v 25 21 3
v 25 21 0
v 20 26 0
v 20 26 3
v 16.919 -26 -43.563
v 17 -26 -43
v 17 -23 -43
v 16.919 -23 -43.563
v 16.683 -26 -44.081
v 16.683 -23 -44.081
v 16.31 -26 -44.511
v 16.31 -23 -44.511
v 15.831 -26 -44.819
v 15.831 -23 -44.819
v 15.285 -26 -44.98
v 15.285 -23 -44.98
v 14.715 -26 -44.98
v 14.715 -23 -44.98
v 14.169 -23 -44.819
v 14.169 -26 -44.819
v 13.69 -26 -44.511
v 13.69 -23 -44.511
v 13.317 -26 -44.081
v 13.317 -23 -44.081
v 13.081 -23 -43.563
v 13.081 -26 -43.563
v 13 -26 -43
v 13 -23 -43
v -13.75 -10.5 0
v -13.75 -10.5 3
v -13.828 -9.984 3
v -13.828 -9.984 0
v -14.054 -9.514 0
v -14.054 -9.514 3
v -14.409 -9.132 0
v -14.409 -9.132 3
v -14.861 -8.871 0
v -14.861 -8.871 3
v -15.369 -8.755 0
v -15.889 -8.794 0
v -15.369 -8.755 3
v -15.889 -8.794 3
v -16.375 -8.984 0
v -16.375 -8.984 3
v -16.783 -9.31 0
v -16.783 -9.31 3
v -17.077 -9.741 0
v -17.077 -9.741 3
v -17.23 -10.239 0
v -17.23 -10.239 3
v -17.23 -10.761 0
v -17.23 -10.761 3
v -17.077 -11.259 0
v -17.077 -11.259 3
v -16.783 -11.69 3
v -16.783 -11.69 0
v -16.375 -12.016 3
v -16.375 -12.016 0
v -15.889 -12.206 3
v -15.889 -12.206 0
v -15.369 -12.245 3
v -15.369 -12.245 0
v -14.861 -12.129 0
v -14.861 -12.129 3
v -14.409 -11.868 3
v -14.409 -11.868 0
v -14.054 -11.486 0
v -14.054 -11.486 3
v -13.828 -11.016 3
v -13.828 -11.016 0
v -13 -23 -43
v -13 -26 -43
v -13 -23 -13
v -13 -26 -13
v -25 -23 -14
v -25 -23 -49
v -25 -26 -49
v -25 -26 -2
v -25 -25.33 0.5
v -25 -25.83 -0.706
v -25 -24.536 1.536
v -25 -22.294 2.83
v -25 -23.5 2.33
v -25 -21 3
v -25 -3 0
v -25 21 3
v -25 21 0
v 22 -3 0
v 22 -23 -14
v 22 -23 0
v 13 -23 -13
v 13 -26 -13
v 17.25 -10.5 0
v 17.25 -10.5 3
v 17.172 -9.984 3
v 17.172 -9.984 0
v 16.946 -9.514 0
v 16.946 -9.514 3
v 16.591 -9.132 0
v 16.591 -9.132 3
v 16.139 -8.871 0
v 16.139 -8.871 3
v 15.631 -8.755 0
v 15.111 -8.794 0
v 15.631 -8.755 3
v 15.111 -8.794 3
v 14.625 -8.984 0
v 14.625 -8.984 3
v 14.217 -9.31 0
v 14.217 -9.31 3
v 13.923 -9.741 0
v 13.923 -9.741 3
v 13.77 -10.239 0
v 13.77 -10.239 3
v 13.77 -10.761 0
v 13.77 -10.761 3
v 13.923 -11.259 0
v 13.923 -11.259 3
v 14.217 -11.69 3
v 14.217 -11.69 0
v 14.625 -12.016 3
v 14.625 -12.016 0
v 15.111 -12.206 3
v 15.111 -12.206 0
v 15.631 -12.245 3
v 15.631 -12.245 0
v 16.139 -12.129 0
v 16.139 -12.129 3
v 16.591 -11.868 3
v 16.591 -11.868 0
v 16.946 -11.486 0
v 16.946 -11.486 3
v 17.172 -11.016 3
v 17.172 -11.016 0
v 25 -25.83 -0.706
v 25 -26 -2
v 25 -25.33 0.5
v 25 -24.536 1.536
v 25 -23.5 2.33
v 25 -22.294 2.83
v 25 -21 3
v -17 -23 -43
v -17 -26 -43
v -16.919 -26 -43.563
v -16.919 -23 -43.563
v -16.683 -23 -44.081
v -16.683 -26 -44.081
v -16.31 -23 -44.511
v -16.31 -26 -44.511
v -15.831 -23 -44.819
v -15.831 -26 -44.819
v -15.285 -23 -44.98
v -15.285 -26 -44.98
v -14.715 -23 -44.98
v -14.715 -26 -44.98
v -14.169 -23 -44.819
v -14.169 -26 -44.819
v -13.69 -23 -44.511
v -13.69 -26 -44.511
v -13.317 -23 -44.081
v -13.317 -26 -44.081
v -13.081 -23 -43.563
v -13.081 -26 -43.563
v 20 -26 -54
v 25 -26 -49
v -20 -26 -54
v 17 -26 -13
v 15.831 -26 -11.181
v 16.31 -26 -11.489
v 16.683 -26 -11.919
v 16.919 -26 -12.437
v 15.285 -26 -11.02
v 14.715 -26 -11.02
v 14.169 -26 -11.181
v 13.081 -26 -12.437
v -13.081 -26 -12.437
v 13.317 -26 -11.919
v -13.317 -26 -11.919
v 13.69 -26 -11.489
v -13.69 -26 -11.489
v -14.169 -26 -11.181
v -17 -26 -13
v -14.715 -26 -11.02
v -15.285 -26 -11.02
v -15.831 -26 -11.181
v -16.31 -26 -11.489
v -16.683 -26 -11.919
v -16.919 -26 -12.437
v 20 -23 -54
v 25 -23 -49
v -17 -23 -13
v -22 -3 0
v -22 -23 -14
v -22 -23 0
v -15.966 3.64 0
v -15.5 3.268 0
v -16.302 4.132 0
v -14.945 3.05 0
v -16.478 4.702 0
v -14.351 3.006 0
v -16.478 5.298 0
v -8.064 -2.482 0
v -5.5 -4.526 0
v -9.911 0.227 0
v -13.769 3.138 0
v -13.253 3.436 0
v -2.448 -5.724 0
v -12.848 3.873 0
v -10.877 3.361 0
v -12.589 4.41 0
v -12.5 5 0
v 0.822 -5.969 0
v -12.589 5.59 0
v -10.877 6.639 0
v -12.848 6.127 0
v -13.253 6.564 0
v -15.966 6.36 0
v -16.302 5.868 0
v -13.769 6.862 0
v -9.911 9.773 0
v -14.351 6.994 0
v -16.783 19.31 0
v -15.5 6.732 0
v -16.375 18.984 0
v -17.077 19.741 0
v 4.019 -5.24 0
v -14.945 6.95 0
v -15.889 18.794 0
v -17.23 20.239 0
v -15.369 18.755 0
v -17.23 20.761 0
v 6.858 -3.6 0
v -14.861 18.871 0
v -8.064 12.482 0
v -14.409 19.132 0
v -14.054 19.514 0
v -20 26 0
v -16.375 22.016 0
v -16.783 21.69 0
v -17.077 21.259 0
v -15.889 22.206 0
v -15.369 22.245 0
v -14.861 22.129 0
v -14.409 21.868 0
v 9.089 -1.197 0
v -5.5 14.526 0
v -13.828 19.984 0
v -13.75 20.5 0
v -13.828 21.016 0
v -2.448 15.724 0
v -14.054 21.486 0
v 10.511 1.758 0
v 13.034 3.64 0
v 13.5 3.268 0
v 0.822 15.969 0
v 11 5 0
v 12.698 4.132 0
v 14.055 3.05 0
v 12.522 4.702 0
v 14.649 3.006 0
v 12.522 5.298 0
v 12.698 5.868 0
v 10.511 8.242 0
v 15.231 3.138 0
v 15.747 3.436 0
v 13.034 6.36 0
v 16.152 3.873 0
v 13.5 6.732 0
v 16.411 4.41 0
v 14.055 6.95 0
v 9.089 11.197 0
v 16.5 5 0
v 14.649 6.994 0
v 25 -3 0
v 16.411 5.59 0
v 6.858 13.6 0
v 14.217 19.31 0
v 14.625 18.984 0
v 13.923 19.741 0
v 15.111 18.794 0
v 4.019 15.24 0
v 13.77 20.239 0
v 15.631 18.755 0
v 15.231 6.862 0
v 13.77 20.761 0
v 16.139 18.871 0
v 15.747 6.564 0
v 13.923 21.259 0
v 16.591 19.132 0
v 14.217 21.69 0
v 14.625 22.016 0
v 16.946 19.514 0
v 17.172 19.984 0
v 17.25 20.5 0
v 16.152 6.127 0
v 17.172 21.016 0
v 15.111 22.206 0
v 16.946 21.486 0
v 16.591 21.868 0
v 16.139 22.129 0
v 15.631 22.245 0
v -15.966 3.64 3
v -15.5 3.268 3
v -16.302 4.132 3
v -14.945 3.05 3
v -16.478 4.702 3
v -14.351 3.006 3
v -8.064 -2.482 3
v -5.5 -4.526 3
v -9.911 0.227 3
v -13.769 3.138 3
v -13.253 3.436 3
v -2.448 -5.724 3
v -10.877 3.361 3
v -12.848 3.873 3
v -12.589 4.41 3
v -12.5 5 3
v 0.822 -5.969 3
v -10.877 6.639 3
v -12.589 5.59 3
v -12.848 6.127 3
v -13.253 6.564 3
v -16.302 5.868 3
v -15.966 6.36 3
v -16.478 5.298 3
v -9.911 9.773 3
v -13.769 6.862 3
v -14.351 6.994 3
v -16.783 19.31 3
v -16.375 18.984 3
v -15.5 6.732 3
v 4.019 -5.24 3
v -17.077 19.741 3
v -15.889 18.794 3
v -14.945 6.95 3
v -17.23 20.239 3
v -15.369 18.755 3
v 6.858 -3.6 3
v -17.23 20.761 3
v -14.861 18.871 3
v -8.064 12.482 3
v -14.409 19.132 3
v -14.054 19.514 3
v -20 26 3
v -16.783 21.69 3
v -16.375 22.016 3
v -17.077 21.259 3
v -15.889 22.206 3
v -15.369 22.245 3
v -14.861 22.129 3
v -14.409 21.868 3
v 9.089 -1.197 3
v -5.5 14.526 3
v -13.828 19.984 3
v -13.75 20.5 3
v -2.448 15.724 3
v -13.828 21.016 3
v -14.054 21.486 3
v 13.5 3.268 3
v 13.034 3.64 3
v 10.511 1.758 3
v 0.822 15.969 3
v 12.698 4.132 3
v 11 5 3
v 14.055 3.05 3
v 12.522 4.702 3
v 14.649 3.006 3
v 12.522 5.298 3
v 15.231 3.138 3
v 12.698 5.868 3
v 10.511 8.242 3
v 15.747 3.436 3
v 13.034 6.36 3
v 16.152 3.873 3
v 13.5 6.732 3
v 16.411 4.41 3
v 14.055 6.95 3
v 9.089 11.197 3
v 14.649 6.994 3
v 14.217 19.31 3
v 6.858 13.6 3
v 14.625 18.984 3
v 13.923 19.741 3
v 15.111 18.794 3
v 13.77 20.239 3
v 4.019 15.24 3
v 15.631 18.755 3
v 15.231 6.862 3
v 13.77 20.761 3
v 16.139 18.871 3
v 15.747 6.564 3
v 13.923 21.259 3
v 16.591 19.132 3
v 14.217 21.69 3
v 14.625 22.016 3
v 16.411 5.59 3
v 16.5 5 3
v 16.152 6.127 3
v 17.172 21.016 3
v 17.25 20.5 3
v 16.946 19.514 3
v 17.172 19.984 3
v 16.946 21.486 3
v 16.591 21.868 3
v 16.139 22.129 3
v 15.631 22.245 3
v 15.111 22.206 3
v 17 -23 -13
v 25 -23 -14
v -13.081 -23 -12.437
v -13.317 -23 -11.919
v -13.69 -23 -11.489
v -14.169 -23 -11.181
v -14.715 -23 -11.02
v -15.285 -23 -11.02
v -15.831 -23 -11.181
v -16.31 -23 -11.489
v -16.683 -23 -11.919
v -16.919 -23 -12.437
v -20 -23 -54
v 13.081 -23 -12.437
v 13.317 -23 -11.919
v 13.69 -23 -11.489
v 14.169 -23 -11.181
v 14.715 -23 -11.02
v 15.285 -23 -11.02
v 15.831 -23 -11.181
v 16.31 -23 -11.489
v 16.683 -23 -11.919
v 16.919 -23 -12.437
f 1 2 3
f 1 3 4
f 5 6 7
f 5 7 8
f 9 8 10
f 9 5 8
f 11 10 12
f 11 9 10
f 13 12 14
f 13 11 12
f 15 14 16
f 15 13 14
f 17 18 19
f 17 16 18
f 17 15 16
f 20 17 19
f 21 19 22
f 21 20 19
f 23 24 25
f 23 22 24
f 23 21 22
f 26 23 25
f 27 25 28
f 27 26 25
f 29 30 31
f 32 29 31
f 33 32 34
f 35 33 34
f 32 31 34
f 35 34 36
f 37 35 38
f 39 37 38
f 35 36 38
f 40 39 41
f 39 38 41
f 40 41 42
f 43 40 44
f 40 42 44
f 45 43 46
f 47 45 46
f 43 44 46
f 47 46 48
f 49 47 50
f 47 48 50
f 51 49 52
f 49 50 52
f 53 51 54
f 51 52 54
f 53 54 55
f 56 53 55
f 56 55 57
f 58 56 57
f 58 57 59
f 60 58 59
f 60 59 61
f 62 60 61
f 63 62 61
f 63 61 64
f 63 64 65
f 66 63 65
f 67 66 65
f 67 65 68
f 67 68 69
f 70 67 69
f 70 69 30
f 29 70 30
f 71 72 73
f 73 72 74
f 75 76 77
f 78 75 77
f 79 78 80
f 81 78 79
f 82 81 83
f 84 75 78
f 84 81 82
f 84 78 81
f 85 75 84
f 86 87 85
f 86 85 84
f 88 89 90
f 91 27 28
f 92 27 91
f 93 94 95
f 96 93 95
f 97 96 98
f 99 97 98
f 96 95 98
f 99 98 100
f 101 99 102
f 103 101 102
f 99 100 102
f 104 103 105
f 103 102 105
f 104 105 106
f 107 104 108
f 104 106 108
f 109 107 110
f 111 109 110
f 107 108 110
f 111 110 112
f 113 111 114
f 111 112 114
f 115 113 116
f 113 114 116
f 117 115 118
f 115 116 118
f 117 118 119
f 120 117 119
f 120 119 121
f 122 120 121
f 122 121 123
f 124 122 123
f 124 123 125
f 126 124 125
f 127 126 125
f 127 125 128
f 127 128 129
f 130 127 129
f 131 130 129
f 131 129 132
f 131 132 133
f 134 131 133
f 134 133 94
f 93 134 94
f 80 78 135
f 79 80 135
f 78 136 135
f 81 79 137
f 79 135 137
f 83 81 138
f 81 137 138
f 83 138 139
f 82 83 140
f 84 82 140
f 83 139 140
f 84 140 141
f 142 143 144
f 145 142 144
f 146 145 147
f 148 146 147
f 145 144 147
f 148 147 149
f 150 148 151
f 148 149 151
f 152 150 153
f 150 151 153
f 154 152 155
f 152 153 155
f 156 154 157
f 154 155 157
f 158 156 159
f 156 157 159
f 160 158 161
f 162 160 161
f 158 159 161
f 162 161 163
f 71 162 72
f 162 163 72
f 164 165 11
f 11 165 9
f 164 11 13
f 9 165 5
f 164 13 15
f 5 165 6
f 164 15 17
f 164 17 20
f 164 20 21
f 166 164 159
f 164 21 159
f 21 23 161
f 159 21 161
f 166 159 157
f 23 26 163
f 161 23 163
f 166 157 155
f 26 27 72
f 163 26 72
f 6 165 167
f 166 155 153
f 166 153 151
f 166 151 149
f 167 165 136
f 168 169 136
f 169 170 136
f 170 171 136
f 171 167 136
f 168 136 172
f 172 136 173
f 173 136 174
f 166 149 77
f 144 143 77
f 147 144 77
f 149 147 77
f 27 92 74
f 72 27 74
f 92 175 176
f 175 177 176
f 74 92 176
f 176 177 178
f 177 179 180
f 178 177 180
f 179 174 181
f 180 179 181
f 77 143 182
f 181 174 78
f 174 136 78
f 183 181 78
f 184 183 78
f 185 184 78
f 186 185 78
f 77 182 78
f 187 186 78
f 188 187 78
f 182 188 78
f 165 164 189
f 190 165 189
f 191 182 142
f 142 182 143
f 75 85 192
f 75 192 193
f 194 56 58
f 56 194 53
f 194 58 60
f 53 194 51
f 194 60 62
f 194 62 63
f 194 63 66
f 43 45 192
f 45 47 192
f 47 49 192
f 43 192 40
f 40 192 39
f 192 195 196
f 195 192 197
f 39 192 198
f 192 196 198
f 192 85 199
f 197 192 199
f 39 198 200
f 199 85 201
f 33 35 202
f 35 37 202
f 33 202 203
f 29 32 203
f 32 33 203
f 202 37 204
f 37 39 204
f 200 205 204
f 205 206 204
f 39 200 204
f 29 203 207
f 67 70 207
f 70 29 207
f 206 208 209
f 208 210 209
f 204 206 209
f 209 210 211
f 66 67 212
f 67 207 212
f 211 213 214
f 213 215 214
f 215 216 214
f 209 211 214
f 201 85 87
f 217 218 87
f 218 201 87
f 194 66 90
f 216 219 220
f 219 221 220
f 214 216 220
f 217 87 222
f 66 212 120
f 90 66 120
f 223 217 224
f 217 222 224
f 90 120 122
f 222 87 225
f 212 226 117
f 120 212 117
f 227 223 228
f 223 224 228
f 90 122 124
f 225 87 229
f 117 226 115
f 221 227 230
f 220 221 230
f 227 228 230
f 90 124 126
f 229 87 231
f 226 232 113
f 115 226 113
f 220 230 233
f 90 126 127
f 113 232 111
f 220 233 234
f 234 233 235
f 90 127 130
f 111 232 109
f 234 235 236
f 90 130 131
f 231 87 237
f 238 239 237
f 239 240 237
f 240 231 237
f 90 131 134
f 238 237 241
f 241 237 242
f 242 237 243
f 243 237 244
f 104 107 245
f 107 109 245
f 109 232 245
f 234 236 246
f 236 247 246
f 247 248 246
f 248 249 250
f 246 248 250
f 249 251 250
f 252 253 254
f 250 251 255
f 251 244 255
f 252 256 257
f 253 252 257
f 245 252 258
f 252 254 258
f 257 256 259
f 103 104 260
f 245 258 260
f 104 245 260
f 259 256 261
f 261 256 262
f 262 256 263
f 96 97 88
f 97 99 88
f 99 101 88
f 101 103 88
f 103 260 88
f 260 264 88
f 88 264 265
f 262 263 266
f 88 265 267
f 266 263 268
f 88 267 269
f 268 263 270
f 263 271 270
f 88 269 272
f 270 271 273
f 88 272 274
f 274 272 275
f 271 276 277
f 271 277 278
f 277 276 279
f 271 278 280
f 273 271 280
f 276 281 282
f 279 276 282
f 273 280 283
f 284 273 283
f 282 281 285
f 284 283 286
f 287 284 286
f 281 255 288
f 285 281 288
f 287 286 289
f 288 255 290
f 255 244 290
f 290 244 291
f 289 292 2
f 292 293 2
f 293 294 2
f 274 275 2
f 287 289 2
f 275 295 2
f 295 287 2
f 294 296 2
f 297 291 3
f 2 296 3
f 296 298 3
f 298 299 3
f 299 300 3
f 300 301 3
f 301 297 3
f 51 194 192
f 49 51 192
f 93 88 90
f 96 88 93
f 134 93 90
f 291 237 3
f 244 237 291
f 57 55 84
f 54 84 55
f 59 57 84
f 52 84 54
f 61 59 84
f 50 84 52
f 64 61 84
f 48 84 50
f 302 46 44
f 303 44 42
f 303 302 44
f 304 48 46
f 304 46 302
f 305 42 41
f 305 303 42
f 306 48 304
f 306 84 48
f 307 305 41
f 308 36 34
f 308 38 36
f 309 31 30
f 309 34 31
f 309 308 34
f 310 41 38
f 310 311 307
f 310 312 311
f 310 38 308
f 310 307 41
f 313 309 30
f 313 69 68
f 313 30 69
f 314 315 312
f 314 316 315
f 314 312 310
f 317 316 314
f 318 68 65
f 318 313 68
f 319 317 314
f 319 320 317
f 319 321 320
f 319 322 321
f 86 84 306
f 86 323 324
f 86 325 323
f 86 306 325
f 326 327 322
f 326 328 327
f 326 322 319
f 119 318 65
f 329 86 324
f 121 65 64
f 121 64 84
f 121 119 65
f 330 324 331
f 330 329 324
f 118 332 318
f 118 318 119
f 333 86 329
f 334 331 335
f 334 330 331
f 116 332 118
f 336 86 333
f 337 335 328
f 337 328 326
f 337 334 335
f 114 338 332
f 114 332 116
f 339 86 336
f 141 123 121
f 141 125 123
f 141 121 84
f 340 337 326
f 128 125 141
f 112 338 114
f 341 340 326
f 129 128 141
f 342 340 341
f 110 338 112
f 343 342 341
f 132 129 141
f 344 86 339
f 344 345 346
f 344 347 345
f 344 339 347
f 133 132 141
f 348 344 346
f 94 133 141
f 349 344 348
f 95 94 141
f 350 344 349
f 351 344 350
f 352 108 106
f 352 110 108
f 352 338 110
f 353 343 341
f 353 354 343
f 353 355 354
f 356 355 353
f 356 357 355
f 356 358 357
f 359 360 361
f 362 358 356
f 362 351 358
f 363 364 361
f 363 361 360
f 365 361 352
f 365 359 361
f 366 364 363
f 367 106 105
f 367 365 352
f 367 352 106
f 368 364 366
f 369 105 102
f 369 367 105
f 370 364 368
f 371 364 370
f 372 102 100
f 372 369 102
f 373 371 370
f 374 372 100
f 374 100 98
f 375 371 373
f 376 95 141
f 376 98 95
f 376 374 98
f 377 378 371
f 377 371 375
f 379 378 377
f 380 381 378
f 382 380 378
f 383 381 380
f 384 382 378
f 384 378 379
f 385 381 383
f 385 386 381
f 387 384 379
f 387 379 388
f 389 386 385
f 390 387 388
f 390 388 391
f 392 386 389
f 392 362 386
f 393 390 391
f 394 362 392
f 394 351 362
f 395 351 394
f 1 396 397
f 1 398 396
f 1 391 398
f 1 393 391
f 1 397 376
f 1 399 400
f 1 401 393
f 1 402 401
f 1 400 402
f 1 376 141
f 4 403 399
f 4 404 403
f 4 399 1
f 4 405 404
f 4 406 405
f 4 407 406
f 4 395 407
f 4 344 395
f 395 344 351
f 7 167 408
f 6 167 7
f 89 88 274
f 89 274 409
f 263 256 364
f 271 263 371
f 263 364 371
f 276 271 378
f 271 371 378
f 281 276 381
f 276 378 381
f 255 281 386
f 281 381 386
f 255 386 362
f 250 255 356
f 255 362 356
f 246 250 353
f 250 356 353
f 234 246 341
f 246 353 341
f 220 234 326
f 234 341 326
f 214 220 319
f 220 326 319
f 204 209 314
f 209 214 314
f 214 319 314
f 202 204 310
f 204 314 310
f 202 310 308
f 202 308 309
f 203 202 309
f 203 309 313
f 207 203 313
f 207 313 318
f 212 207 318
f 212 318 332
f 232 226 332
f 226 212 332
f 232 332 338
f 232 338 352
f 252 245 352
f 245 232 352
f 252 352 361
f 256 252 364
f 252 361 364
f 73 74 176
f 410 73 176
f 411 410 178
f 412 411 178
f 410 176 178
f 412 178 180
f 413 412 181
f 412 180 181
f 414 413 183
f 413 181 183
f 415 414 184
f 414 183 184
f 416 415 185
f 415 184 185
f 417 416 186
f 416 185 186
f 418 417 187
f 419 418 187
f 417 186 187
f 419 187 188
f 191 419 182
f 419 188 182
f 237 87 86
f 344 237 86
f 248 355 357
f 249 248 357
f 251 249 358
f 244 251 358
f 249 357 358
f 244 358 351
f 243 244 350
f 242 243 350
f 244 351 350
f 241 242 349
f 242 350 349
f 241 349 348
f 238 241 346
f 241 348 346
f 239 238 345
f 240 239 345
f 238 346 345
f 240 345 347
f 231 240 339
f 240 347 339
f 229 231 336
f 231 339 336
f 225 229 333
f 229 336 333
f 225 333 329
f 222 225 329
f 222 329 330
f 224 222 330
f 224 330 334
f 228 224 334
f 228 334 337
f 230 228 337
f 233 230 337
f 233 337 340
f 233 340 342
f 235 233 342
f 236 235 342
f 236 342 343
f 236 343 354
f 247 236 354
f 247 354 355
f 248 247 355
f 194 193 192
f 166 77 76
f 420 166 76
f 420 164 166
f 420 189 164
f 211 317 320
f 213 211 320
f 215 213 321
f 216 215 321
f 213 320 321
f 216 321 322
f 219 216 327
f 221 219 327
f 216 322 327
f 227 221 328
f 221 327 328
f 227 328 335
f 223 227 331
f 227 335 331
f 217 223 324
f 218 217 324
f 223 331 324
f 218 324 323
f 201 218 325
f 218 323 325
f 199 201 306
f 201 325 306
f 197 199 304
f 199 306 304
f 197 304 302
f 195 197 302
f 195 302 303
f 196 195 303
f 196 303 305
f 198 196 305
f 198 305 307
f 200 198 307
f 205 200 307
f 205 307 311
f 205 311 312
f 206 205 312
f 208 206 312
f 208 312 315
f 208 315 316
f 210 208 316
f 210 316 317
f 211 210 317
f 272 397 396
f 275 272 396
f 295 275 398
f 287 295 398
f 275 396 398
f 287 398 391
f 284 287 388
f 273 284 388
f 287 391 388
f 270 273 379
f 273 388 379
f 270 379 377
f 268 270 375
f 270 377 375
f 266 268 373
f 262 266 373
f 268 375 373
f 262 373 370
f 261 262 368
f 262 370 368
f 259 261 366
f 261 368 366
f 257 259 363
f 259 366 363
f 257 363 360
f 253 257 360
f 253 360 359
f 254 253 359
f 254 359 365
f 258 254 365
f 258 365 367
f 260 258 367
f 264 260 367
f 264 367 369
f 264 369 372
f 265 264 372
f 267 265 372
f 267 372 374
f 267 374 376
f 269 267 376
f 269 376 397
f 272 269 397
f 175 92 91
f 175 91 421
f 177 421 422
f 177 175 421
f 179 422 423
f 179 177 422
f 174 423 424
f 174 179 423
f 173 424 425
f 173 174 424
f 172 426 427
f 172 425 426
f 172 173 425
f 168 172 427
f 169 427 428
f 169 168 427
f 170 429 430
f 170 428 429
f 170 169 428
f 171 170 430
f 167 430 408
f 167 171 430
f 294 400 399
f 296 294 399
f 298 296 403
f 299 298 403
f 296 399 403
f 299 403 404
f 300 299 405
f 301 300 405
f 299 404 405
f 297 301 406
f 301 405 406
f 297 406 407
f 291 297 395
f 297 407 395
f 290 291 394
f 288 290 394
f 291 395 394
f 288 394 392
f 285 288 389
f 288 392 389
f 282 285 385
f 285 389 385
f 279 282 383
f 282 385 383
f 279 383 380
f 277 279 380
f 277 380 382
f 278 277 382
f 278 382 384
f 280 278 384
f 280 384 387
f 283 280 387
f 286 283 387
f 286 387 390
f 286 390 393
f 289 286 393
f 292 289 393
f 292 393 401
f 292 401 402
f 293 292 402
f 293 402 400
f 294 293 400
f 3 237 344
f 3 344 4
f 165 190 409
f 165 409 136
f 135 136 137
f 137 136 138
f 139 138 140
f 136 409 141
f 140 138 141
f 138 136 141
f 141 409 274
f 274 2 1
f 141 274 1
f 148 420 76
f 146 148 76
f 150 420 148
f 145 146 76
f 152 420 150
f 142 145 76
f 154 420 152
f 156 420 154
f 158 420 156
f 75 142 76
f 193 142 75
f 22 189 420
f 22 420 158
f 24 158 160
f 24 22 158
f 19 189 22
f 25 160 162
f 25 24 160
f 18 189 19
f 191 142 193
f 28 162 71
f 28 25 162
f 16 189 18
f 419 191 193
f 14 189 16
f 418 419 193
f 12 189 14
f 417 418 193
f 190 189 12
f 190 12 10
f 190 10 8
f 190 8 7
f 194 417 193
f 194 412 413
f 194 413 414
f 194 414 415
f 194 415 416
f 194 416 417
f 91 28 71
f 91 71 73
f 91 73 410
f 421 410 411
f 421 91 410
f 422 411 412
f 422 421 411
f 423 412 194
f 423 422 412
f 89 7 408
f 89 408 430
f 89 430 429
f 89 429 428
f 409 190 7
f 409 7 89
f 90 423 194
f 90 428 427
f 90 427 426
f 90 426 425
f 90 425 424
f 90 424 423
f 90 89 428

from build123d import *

# Parameters (mm, degrees)
SKETCH_1_W          = 50
SKETCH_1_H          = 52
EXTRUDE_1_DEPTH     = 3
SKETCH_2_W          = 50
SKETCH_2_H          = 3
EXTRUDE_2_DEPTH     = 54
SKETCH_3_R          = 11
SKETCH_3_R_2        = 2
SKETCH_3_R_3        = 1.75
CUT_EXTRUDE_1_DEPTH = 68.453687816
CHAMFER_1_SIZE      = 5
CHAMFER_2_SIZE      = 5
CUT_EXTRUDE_2_DEPTH = 80.025312401
EXTRUDE_START       = -50
EXTRUDE_3_DEPTH     = 50
CUT_EXTRUDE_START   = -3
CUT_EXTRUDE_3_DEPTH = 44
FILLET_1_R          = 5


with BuildPart() as part:
    # 草圖1 → 填料-伸長1 (new body)
    with BuildSketch(Plane.XY):
        Rectangle(SKETCH_1_W, SKETCH_1_H)
    extrude(amount=EXTRUDE_1_DEPTH)

    # 草圖2 → 填料-伸長2 (add)
    with BuildSketch(Plane(origin=(0, 0, 0), x_dir=(-1, 0, 0), z_dir=(0, 0, -1))):
        with Locations((0, -24.5)):
            Rectangle(SKETCH_2_W, SKETCH_2_H)
    extrude(amount=EXTRUDE_2_DEPTH)

    # 草圖3 → 除料-伸長1 (cut, through all)
    with BuildSketch(Plane.XY.offset(3)):
        with Locations((0, 5)):
            Circle(SKETCH_3_R)
        with Locations((14.5, 5)):
            Circle(SKETCH_3_R_2)
        with Locations((-14.5, 5)):
            Circle(SKETCH_3_R_2)
        with Locations((-15.5, -10.5)):
            Circle(SKETCH_3_R_3)
        with Locations((-15.5, 20.5)):
            Circle(SKETCH_3_R_3)
        with Locations((15.5, 20.5)):
            Circle(SKETCH_3_R_3)
        with Locations((15.5, -10.5)):
            Circle(SKETCH_3_R_3)
    extrude(amount=-CUT_EXTRUDE_1_DEPTH, mode=Mode.SUBTRACT)

    # 導角1
    chamfer_1_edges = [part.edges().sort_by_distance(p)[0] for p in [
        (-25, 26, 1.5),
        (25, 26, 1.5),
    ]]
    chamfer(chamfer_1_edges, length=CHAMFER_1_SIZE)

    # 導角2
    chamfer_2_edges = [part.edges().sort_by_distance(p)[0] for p in [
        (25, -24.5, -54),
        (-25, -24.5, -54),
    ]]
    chamfer(chamfer_2_edges, length=CHAMFER_2_SIZE)

    # 草圖4 → 除料-伸長2 (cut, through all)
    with BuildSketch(Plane.XZ.offset(26)):
        with BuildLine():
            Line((13, -43), (13, -13))
            ThreePointArc((13, -13), (15, -11), (17, -13))
            Line((17, -13), (17, -43))
            ThreePointArc((17, -43), (15, -45), (13, -43))
        make_face()
        with BuildLine():
            Line((-13, -43), (-13, -13))
            ThreePointArc((-13, -13), (-15, -11), (-17, -13))
            Line((-17, -13), (-17, -43))
            ThreePointArc((-17, -43), (-15, -45), (-13, -43))
        make_face()
    extrude(amount=-CUT_EXTRUDE_2_DEPTH, mode=Mode.SUBTRACT)

    # 草圖5 → 填料-伸長3 (add)
    with BuildSketch(Plane(origin=(25, 0, 0), x_dir=(0, 0, -1), z_dir=(1, 0, 0)).offset(EXTRUDE_START)):
        Polygon((0, -23), (0, -3), (14, -23), align=None)
    extrude(amount=EXTRUDE_3_DEPTH)

    # 草圖6 → 除料-伸長3 (cut)
    with BuildSketch(Plane(origin=(25, 0, 0), x_dir=(0, 0, -1), z_dir=(1, 0, 0)).offset(CUT_EXTRUDE_START)):
        Polygon((0, -3), (14, -23), (0, -23), align=None)
    extrude(amount=-CUT_EXTRUDE_3_DEPTH, mode=Mode.SUBTRACT)

    # 圓角1
    fillet_1_edges = [part.edges().sort_by_distance(p)[0] for p in [
        (0, -26, 3),
    ]]
    fillet(fillet_1_edges, radius=FILLET_1_R)


solid = part.part
